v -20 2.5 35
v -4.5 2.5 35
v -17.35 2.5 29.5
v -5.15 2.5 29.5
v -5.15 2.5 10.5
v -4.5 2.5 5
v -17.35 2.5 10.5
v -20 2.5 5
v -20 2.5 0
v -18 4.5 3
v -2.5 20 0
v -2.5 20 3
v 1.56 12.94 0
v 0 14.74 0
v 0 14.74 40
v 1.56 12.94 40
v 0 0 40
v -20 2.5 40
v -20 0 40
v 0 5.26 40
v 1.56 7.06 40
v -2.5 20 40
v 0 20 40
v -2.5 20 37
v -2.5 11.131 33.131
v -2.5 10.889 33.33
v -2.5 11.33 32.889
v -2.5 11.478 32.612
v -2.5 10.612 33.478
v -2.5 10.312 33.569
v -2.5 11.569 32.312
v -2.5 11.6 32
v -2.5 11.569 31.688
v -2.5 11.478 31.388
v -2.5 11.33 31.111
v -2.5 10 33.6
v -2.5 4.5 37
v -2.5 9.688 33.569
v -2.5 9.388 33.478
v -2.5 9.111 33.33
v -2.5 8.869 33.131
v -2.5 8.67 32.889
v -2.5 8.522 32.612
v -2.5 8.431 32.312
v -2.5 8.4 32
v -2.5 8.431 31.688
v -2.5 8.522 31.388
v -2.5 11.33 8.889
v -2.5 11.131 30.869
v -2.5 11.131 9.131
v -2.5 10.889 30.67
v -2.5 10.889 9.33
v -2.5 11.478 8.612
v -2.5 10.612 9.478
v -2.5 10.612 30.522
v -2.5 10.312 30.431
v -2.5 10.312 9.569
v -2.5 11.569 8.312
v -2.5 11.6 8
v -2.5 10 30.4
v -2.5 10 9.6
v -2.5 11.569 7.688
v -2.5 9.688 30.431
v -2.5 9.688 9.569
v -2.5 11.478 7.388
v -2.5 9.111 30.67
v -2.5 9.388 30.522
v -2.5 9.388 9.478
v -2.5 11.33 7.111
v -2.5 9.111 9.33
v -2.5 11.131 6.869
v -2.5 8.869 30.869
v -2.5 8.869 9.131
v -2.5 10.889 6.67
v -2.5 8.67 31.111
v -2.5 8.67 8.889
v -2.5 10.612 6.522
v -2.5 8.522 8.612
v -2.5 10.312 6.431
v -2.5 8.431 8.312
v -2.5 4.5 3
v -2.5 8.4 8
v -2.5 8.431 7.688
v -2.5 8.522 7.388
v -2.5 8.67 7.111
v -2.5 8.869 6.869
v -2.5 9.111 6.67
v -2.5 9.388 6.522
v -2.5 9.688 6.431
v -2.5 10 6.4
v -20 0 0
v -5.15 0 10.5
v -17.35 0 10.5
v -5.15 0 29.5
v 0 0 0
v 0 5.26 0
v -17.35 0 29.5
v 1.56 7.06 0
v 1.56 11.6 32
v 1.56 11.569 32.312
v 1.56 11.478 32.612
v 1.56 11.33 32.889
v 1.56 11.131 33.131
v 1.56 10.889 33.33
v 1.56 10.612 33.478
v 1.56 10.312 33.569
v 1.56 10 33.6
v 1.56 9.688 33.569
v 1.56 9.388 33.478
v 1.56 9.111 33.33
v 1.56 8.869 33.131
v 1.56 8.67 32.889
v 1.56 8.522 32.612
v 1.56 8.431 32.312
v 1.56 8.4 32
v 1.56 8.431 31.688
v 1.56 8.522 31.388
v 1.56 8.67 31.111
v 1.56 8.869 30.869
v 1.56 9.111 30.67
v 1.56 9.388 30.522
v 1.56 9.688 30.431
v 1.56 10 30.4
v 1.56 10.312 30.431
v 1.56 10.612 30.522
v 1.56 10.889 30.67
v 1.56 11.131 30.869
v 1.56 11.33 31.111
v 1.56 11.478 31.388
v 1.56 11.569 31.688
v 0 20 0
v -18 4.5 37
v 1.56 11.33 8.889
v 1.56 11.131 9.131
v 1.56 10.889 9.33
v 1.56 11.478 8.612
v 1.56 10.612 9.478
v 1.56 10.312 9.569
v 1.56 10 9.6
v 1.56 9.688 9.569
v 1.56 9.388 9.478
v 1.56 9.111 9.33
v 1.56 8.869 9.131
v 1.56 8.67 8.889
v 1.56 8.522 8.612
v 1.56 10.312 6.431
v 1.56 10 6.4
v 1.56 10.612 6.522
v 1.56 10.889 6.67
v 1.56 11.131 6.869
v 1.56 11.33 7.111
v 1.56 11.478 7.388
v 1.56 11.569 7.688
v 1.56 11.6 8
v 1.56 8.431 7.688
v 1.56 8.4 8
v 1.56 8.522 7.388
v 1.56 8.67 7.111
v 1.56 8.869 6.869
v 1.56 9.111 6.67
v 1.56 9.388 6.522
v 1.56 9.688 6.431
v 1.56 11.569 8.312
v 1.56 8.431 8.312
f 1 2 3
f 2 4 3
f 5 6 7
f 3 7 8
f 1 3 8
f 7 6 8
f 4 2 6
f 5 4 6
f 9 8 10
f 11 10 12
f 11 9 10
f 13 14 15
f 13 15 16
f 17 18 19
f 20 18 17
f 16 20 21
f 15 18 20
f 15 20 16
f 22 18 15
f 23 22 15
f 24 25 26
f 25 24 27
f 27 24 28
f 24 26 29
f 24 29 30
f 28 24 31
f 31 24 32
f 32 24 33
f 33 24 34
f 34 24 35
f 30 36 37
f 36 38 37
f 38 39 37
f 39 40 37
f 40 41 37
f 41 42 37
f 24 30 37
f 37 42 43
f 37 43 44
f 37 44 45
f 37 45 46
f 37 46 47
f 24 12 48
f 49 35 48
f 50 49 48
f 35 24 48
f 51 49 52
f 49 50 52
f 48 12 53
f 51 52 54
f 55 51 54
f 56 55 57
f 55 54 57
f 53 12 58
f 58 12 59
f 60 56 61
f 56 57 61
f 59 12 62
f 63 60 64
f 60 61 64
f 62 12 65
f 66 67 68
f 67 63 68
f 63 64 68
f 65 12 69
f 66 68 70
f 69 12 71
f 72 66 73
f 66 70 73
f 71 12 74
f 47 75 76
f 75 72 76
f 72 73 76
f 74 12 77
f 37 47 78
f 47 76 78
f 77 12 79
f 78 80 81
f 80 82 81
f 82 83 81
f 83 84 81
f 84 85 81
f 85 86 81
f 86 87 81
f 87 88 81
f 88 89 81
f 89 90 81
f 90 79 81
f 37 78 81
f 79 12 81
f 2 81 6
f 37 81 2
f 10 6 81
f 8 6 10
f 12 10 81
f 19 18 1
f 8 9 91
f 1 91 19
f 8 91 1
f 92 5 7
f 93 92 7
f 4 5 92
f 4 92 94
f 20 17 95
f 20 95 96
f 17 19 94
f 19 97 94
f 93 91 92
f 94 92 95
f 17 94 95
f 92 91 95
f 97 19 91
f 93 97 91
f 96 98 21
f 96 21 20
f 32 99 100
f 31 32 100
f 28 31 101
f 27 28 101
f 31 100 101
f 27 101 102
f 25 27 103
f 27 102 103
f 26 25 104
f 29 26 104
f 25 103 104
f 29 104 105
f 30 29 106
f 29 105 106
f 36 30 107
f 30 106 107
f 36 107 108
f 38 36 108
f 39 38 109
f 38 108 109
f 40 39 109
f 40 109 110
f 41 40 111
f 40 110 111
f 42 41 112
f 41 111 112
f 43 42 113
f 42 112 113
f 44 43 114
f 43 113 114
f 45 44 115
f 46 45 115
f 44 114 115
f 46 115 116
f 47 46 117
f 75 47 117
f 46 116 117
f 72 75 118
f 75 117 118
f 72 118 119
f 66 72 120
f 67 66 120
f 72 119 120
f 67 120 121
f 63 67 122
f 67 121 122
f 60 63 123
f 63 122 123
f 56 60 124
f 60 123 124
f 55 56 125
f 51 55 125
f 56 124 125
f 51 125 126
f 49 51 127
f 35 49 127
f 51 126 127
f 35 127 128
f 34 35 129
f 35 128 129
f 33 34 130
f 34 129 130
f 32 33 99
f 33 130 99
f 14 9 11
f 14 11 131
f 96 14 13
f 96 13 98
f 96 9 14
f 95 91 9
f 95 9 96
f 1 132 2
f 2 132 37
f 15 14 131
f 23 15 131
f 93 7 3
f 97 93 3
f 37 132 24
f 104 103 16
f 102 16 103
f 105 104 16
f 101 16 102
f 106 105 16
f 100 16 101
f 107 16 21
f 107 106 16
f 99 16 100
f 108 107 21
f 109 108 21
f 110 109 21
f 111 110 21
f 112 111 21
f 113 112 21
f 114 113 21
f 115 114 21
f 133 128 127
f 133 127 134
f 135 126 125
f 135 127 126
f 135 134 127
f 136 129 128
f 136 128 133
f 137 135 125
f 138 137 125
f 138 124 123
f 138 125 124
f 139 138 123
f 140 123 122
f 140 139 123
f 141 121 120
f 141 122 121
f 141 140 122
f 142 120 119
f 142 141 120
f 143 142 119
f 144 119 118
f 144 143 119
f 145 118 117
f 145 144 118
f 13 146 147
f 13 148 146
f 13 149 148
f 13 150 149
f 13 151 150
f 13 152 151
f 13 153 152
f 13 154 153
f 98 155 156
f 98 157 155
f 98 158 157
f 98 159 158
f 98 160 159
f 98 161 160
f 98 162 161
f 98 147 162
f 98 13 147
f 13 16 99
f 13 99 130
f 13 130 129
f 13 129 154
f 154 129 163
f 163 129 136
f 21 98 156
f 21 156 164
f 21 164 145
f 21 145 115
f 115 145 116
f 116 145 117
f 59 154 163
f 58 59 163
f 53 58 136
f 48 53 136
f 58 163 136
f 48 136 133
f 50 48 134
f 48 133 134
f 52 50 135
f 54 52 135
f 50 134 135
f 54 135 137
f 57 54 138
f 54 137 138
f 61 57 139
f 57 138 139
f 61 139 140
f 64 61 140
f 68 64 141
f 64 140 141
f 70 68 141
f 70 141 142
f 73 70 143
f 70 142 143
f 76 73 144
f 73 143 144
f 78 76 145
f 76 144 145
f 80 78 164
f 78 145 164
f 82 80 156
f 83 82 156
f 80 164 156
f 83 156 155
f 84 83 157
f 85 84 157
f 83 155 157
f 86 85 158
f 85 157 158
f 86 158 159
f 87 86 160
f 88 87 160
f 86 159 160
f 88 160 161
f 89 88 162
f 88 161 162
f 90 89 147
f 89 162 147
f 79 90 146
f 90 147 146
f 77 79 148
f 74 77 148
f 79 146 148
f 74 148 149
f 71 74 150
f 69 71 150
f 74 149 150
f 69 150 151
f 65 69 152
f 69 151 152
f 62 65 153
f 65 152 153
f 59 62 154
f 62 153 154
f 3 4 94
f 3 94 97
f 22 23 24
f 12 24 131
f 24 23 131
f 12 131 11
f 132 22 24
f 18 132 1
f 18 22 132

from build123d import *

# Parameters (mm, degrees)
PAD_DEPTH       = 40
PAD001_DEPTH    = 3
PAD002_DEPTH    = 3
PAD003_DEPTH    = 40
SKETCH004_W     = 12.2
SKETCH004_H     = 19
POCKET_DEPTH    = 2.5
SKETCH005_R     = 1.6
POCKET001_DEPTH = 4.06
CHAMFER_SIZE    = 2


with BuildPart() as part:
    # Sketch → Pad (new body)
    with BuildSketch(Plane.XY):
        Polygon((0, 0), (0, 20), (-2.5, 20), (-2.5, 2.5), (-20, 2.5), (-20, 0), align=None)
    extrude(amount=PAD_DEPTH)

    # Sketch001 (on Face8 of Pad) → Pad001 (join)
    with BuildSketch(Plane.XY.offset(40)):
        Polygon((-2.5, 20), (-20, 2.5), (-2.5, 2.5), align=None)
    extrude(amount=-PAD001_DEPTH)

    # Sketch002 (on Face4 of Pad001) → Pad002 (join)
    with BuildSketch(Plane(origin=(0, 0, 0), x_dir=(1, 0, 0), z_dir=(0, 0, -1))):
        Polygon((-20, -2.5), (-2.5, -20), (-2.5, -2.5), align=None)
    extrude(amount=-PAD002_DEPTH)

    # Sketch003 (on Face4 of Pad002) → Pad003 (join)
    with BuildSketch(Plane(origin=(0, 0, 0), x_dir=(1, 0, 0), z_dir=(0, 0, -1))):
        Polygon((0, -5.26), (0, -14.74), (1.56, -12.94), (1.56, -7.06), align=None)
    extrude(amount=-PAD003_DEPTH)

    # Sketch004 (on Face18 of Pad003) → Pocket (cut)
    with BuildSketch(Plane(origin=(0, 2.5, 0), x_dir=(-1, 0, 0), z_dir=(0, 1, 0))):
        with Locations((11.25, 20)):
            Rectangle(SKETCH004_W, SKETCH004_H)
    extrude(amount=-POCKET_DEPTH, mode=Mode.SUBTRACT)

    # Sketch005 (on Face12 of Pocket) → Pocket001 (cut)
    with BuildSketch(Plane.YZ.offset(1.56)):
        with Locations((10, 32)):
            Circle(SKETCH005_R)
        with Locations((10, 8)):
            Circle(SKETCH005_R)
    extrude(amount=-POCKET001_DEPTH, mode=Mode.SUBTRACT)

    # Chamfer
    chamfer_edges = [part.edges().sort_by_distance(p)[0] for p in [
        (-11.25, 2.5, 3),
        (-2.5, 2.5, 20),
        (-11.25, 2.5, 37),
    ]]
    chamfer(chamfer_edges, length=CHAMFER_SIZE)


solid = part.part
